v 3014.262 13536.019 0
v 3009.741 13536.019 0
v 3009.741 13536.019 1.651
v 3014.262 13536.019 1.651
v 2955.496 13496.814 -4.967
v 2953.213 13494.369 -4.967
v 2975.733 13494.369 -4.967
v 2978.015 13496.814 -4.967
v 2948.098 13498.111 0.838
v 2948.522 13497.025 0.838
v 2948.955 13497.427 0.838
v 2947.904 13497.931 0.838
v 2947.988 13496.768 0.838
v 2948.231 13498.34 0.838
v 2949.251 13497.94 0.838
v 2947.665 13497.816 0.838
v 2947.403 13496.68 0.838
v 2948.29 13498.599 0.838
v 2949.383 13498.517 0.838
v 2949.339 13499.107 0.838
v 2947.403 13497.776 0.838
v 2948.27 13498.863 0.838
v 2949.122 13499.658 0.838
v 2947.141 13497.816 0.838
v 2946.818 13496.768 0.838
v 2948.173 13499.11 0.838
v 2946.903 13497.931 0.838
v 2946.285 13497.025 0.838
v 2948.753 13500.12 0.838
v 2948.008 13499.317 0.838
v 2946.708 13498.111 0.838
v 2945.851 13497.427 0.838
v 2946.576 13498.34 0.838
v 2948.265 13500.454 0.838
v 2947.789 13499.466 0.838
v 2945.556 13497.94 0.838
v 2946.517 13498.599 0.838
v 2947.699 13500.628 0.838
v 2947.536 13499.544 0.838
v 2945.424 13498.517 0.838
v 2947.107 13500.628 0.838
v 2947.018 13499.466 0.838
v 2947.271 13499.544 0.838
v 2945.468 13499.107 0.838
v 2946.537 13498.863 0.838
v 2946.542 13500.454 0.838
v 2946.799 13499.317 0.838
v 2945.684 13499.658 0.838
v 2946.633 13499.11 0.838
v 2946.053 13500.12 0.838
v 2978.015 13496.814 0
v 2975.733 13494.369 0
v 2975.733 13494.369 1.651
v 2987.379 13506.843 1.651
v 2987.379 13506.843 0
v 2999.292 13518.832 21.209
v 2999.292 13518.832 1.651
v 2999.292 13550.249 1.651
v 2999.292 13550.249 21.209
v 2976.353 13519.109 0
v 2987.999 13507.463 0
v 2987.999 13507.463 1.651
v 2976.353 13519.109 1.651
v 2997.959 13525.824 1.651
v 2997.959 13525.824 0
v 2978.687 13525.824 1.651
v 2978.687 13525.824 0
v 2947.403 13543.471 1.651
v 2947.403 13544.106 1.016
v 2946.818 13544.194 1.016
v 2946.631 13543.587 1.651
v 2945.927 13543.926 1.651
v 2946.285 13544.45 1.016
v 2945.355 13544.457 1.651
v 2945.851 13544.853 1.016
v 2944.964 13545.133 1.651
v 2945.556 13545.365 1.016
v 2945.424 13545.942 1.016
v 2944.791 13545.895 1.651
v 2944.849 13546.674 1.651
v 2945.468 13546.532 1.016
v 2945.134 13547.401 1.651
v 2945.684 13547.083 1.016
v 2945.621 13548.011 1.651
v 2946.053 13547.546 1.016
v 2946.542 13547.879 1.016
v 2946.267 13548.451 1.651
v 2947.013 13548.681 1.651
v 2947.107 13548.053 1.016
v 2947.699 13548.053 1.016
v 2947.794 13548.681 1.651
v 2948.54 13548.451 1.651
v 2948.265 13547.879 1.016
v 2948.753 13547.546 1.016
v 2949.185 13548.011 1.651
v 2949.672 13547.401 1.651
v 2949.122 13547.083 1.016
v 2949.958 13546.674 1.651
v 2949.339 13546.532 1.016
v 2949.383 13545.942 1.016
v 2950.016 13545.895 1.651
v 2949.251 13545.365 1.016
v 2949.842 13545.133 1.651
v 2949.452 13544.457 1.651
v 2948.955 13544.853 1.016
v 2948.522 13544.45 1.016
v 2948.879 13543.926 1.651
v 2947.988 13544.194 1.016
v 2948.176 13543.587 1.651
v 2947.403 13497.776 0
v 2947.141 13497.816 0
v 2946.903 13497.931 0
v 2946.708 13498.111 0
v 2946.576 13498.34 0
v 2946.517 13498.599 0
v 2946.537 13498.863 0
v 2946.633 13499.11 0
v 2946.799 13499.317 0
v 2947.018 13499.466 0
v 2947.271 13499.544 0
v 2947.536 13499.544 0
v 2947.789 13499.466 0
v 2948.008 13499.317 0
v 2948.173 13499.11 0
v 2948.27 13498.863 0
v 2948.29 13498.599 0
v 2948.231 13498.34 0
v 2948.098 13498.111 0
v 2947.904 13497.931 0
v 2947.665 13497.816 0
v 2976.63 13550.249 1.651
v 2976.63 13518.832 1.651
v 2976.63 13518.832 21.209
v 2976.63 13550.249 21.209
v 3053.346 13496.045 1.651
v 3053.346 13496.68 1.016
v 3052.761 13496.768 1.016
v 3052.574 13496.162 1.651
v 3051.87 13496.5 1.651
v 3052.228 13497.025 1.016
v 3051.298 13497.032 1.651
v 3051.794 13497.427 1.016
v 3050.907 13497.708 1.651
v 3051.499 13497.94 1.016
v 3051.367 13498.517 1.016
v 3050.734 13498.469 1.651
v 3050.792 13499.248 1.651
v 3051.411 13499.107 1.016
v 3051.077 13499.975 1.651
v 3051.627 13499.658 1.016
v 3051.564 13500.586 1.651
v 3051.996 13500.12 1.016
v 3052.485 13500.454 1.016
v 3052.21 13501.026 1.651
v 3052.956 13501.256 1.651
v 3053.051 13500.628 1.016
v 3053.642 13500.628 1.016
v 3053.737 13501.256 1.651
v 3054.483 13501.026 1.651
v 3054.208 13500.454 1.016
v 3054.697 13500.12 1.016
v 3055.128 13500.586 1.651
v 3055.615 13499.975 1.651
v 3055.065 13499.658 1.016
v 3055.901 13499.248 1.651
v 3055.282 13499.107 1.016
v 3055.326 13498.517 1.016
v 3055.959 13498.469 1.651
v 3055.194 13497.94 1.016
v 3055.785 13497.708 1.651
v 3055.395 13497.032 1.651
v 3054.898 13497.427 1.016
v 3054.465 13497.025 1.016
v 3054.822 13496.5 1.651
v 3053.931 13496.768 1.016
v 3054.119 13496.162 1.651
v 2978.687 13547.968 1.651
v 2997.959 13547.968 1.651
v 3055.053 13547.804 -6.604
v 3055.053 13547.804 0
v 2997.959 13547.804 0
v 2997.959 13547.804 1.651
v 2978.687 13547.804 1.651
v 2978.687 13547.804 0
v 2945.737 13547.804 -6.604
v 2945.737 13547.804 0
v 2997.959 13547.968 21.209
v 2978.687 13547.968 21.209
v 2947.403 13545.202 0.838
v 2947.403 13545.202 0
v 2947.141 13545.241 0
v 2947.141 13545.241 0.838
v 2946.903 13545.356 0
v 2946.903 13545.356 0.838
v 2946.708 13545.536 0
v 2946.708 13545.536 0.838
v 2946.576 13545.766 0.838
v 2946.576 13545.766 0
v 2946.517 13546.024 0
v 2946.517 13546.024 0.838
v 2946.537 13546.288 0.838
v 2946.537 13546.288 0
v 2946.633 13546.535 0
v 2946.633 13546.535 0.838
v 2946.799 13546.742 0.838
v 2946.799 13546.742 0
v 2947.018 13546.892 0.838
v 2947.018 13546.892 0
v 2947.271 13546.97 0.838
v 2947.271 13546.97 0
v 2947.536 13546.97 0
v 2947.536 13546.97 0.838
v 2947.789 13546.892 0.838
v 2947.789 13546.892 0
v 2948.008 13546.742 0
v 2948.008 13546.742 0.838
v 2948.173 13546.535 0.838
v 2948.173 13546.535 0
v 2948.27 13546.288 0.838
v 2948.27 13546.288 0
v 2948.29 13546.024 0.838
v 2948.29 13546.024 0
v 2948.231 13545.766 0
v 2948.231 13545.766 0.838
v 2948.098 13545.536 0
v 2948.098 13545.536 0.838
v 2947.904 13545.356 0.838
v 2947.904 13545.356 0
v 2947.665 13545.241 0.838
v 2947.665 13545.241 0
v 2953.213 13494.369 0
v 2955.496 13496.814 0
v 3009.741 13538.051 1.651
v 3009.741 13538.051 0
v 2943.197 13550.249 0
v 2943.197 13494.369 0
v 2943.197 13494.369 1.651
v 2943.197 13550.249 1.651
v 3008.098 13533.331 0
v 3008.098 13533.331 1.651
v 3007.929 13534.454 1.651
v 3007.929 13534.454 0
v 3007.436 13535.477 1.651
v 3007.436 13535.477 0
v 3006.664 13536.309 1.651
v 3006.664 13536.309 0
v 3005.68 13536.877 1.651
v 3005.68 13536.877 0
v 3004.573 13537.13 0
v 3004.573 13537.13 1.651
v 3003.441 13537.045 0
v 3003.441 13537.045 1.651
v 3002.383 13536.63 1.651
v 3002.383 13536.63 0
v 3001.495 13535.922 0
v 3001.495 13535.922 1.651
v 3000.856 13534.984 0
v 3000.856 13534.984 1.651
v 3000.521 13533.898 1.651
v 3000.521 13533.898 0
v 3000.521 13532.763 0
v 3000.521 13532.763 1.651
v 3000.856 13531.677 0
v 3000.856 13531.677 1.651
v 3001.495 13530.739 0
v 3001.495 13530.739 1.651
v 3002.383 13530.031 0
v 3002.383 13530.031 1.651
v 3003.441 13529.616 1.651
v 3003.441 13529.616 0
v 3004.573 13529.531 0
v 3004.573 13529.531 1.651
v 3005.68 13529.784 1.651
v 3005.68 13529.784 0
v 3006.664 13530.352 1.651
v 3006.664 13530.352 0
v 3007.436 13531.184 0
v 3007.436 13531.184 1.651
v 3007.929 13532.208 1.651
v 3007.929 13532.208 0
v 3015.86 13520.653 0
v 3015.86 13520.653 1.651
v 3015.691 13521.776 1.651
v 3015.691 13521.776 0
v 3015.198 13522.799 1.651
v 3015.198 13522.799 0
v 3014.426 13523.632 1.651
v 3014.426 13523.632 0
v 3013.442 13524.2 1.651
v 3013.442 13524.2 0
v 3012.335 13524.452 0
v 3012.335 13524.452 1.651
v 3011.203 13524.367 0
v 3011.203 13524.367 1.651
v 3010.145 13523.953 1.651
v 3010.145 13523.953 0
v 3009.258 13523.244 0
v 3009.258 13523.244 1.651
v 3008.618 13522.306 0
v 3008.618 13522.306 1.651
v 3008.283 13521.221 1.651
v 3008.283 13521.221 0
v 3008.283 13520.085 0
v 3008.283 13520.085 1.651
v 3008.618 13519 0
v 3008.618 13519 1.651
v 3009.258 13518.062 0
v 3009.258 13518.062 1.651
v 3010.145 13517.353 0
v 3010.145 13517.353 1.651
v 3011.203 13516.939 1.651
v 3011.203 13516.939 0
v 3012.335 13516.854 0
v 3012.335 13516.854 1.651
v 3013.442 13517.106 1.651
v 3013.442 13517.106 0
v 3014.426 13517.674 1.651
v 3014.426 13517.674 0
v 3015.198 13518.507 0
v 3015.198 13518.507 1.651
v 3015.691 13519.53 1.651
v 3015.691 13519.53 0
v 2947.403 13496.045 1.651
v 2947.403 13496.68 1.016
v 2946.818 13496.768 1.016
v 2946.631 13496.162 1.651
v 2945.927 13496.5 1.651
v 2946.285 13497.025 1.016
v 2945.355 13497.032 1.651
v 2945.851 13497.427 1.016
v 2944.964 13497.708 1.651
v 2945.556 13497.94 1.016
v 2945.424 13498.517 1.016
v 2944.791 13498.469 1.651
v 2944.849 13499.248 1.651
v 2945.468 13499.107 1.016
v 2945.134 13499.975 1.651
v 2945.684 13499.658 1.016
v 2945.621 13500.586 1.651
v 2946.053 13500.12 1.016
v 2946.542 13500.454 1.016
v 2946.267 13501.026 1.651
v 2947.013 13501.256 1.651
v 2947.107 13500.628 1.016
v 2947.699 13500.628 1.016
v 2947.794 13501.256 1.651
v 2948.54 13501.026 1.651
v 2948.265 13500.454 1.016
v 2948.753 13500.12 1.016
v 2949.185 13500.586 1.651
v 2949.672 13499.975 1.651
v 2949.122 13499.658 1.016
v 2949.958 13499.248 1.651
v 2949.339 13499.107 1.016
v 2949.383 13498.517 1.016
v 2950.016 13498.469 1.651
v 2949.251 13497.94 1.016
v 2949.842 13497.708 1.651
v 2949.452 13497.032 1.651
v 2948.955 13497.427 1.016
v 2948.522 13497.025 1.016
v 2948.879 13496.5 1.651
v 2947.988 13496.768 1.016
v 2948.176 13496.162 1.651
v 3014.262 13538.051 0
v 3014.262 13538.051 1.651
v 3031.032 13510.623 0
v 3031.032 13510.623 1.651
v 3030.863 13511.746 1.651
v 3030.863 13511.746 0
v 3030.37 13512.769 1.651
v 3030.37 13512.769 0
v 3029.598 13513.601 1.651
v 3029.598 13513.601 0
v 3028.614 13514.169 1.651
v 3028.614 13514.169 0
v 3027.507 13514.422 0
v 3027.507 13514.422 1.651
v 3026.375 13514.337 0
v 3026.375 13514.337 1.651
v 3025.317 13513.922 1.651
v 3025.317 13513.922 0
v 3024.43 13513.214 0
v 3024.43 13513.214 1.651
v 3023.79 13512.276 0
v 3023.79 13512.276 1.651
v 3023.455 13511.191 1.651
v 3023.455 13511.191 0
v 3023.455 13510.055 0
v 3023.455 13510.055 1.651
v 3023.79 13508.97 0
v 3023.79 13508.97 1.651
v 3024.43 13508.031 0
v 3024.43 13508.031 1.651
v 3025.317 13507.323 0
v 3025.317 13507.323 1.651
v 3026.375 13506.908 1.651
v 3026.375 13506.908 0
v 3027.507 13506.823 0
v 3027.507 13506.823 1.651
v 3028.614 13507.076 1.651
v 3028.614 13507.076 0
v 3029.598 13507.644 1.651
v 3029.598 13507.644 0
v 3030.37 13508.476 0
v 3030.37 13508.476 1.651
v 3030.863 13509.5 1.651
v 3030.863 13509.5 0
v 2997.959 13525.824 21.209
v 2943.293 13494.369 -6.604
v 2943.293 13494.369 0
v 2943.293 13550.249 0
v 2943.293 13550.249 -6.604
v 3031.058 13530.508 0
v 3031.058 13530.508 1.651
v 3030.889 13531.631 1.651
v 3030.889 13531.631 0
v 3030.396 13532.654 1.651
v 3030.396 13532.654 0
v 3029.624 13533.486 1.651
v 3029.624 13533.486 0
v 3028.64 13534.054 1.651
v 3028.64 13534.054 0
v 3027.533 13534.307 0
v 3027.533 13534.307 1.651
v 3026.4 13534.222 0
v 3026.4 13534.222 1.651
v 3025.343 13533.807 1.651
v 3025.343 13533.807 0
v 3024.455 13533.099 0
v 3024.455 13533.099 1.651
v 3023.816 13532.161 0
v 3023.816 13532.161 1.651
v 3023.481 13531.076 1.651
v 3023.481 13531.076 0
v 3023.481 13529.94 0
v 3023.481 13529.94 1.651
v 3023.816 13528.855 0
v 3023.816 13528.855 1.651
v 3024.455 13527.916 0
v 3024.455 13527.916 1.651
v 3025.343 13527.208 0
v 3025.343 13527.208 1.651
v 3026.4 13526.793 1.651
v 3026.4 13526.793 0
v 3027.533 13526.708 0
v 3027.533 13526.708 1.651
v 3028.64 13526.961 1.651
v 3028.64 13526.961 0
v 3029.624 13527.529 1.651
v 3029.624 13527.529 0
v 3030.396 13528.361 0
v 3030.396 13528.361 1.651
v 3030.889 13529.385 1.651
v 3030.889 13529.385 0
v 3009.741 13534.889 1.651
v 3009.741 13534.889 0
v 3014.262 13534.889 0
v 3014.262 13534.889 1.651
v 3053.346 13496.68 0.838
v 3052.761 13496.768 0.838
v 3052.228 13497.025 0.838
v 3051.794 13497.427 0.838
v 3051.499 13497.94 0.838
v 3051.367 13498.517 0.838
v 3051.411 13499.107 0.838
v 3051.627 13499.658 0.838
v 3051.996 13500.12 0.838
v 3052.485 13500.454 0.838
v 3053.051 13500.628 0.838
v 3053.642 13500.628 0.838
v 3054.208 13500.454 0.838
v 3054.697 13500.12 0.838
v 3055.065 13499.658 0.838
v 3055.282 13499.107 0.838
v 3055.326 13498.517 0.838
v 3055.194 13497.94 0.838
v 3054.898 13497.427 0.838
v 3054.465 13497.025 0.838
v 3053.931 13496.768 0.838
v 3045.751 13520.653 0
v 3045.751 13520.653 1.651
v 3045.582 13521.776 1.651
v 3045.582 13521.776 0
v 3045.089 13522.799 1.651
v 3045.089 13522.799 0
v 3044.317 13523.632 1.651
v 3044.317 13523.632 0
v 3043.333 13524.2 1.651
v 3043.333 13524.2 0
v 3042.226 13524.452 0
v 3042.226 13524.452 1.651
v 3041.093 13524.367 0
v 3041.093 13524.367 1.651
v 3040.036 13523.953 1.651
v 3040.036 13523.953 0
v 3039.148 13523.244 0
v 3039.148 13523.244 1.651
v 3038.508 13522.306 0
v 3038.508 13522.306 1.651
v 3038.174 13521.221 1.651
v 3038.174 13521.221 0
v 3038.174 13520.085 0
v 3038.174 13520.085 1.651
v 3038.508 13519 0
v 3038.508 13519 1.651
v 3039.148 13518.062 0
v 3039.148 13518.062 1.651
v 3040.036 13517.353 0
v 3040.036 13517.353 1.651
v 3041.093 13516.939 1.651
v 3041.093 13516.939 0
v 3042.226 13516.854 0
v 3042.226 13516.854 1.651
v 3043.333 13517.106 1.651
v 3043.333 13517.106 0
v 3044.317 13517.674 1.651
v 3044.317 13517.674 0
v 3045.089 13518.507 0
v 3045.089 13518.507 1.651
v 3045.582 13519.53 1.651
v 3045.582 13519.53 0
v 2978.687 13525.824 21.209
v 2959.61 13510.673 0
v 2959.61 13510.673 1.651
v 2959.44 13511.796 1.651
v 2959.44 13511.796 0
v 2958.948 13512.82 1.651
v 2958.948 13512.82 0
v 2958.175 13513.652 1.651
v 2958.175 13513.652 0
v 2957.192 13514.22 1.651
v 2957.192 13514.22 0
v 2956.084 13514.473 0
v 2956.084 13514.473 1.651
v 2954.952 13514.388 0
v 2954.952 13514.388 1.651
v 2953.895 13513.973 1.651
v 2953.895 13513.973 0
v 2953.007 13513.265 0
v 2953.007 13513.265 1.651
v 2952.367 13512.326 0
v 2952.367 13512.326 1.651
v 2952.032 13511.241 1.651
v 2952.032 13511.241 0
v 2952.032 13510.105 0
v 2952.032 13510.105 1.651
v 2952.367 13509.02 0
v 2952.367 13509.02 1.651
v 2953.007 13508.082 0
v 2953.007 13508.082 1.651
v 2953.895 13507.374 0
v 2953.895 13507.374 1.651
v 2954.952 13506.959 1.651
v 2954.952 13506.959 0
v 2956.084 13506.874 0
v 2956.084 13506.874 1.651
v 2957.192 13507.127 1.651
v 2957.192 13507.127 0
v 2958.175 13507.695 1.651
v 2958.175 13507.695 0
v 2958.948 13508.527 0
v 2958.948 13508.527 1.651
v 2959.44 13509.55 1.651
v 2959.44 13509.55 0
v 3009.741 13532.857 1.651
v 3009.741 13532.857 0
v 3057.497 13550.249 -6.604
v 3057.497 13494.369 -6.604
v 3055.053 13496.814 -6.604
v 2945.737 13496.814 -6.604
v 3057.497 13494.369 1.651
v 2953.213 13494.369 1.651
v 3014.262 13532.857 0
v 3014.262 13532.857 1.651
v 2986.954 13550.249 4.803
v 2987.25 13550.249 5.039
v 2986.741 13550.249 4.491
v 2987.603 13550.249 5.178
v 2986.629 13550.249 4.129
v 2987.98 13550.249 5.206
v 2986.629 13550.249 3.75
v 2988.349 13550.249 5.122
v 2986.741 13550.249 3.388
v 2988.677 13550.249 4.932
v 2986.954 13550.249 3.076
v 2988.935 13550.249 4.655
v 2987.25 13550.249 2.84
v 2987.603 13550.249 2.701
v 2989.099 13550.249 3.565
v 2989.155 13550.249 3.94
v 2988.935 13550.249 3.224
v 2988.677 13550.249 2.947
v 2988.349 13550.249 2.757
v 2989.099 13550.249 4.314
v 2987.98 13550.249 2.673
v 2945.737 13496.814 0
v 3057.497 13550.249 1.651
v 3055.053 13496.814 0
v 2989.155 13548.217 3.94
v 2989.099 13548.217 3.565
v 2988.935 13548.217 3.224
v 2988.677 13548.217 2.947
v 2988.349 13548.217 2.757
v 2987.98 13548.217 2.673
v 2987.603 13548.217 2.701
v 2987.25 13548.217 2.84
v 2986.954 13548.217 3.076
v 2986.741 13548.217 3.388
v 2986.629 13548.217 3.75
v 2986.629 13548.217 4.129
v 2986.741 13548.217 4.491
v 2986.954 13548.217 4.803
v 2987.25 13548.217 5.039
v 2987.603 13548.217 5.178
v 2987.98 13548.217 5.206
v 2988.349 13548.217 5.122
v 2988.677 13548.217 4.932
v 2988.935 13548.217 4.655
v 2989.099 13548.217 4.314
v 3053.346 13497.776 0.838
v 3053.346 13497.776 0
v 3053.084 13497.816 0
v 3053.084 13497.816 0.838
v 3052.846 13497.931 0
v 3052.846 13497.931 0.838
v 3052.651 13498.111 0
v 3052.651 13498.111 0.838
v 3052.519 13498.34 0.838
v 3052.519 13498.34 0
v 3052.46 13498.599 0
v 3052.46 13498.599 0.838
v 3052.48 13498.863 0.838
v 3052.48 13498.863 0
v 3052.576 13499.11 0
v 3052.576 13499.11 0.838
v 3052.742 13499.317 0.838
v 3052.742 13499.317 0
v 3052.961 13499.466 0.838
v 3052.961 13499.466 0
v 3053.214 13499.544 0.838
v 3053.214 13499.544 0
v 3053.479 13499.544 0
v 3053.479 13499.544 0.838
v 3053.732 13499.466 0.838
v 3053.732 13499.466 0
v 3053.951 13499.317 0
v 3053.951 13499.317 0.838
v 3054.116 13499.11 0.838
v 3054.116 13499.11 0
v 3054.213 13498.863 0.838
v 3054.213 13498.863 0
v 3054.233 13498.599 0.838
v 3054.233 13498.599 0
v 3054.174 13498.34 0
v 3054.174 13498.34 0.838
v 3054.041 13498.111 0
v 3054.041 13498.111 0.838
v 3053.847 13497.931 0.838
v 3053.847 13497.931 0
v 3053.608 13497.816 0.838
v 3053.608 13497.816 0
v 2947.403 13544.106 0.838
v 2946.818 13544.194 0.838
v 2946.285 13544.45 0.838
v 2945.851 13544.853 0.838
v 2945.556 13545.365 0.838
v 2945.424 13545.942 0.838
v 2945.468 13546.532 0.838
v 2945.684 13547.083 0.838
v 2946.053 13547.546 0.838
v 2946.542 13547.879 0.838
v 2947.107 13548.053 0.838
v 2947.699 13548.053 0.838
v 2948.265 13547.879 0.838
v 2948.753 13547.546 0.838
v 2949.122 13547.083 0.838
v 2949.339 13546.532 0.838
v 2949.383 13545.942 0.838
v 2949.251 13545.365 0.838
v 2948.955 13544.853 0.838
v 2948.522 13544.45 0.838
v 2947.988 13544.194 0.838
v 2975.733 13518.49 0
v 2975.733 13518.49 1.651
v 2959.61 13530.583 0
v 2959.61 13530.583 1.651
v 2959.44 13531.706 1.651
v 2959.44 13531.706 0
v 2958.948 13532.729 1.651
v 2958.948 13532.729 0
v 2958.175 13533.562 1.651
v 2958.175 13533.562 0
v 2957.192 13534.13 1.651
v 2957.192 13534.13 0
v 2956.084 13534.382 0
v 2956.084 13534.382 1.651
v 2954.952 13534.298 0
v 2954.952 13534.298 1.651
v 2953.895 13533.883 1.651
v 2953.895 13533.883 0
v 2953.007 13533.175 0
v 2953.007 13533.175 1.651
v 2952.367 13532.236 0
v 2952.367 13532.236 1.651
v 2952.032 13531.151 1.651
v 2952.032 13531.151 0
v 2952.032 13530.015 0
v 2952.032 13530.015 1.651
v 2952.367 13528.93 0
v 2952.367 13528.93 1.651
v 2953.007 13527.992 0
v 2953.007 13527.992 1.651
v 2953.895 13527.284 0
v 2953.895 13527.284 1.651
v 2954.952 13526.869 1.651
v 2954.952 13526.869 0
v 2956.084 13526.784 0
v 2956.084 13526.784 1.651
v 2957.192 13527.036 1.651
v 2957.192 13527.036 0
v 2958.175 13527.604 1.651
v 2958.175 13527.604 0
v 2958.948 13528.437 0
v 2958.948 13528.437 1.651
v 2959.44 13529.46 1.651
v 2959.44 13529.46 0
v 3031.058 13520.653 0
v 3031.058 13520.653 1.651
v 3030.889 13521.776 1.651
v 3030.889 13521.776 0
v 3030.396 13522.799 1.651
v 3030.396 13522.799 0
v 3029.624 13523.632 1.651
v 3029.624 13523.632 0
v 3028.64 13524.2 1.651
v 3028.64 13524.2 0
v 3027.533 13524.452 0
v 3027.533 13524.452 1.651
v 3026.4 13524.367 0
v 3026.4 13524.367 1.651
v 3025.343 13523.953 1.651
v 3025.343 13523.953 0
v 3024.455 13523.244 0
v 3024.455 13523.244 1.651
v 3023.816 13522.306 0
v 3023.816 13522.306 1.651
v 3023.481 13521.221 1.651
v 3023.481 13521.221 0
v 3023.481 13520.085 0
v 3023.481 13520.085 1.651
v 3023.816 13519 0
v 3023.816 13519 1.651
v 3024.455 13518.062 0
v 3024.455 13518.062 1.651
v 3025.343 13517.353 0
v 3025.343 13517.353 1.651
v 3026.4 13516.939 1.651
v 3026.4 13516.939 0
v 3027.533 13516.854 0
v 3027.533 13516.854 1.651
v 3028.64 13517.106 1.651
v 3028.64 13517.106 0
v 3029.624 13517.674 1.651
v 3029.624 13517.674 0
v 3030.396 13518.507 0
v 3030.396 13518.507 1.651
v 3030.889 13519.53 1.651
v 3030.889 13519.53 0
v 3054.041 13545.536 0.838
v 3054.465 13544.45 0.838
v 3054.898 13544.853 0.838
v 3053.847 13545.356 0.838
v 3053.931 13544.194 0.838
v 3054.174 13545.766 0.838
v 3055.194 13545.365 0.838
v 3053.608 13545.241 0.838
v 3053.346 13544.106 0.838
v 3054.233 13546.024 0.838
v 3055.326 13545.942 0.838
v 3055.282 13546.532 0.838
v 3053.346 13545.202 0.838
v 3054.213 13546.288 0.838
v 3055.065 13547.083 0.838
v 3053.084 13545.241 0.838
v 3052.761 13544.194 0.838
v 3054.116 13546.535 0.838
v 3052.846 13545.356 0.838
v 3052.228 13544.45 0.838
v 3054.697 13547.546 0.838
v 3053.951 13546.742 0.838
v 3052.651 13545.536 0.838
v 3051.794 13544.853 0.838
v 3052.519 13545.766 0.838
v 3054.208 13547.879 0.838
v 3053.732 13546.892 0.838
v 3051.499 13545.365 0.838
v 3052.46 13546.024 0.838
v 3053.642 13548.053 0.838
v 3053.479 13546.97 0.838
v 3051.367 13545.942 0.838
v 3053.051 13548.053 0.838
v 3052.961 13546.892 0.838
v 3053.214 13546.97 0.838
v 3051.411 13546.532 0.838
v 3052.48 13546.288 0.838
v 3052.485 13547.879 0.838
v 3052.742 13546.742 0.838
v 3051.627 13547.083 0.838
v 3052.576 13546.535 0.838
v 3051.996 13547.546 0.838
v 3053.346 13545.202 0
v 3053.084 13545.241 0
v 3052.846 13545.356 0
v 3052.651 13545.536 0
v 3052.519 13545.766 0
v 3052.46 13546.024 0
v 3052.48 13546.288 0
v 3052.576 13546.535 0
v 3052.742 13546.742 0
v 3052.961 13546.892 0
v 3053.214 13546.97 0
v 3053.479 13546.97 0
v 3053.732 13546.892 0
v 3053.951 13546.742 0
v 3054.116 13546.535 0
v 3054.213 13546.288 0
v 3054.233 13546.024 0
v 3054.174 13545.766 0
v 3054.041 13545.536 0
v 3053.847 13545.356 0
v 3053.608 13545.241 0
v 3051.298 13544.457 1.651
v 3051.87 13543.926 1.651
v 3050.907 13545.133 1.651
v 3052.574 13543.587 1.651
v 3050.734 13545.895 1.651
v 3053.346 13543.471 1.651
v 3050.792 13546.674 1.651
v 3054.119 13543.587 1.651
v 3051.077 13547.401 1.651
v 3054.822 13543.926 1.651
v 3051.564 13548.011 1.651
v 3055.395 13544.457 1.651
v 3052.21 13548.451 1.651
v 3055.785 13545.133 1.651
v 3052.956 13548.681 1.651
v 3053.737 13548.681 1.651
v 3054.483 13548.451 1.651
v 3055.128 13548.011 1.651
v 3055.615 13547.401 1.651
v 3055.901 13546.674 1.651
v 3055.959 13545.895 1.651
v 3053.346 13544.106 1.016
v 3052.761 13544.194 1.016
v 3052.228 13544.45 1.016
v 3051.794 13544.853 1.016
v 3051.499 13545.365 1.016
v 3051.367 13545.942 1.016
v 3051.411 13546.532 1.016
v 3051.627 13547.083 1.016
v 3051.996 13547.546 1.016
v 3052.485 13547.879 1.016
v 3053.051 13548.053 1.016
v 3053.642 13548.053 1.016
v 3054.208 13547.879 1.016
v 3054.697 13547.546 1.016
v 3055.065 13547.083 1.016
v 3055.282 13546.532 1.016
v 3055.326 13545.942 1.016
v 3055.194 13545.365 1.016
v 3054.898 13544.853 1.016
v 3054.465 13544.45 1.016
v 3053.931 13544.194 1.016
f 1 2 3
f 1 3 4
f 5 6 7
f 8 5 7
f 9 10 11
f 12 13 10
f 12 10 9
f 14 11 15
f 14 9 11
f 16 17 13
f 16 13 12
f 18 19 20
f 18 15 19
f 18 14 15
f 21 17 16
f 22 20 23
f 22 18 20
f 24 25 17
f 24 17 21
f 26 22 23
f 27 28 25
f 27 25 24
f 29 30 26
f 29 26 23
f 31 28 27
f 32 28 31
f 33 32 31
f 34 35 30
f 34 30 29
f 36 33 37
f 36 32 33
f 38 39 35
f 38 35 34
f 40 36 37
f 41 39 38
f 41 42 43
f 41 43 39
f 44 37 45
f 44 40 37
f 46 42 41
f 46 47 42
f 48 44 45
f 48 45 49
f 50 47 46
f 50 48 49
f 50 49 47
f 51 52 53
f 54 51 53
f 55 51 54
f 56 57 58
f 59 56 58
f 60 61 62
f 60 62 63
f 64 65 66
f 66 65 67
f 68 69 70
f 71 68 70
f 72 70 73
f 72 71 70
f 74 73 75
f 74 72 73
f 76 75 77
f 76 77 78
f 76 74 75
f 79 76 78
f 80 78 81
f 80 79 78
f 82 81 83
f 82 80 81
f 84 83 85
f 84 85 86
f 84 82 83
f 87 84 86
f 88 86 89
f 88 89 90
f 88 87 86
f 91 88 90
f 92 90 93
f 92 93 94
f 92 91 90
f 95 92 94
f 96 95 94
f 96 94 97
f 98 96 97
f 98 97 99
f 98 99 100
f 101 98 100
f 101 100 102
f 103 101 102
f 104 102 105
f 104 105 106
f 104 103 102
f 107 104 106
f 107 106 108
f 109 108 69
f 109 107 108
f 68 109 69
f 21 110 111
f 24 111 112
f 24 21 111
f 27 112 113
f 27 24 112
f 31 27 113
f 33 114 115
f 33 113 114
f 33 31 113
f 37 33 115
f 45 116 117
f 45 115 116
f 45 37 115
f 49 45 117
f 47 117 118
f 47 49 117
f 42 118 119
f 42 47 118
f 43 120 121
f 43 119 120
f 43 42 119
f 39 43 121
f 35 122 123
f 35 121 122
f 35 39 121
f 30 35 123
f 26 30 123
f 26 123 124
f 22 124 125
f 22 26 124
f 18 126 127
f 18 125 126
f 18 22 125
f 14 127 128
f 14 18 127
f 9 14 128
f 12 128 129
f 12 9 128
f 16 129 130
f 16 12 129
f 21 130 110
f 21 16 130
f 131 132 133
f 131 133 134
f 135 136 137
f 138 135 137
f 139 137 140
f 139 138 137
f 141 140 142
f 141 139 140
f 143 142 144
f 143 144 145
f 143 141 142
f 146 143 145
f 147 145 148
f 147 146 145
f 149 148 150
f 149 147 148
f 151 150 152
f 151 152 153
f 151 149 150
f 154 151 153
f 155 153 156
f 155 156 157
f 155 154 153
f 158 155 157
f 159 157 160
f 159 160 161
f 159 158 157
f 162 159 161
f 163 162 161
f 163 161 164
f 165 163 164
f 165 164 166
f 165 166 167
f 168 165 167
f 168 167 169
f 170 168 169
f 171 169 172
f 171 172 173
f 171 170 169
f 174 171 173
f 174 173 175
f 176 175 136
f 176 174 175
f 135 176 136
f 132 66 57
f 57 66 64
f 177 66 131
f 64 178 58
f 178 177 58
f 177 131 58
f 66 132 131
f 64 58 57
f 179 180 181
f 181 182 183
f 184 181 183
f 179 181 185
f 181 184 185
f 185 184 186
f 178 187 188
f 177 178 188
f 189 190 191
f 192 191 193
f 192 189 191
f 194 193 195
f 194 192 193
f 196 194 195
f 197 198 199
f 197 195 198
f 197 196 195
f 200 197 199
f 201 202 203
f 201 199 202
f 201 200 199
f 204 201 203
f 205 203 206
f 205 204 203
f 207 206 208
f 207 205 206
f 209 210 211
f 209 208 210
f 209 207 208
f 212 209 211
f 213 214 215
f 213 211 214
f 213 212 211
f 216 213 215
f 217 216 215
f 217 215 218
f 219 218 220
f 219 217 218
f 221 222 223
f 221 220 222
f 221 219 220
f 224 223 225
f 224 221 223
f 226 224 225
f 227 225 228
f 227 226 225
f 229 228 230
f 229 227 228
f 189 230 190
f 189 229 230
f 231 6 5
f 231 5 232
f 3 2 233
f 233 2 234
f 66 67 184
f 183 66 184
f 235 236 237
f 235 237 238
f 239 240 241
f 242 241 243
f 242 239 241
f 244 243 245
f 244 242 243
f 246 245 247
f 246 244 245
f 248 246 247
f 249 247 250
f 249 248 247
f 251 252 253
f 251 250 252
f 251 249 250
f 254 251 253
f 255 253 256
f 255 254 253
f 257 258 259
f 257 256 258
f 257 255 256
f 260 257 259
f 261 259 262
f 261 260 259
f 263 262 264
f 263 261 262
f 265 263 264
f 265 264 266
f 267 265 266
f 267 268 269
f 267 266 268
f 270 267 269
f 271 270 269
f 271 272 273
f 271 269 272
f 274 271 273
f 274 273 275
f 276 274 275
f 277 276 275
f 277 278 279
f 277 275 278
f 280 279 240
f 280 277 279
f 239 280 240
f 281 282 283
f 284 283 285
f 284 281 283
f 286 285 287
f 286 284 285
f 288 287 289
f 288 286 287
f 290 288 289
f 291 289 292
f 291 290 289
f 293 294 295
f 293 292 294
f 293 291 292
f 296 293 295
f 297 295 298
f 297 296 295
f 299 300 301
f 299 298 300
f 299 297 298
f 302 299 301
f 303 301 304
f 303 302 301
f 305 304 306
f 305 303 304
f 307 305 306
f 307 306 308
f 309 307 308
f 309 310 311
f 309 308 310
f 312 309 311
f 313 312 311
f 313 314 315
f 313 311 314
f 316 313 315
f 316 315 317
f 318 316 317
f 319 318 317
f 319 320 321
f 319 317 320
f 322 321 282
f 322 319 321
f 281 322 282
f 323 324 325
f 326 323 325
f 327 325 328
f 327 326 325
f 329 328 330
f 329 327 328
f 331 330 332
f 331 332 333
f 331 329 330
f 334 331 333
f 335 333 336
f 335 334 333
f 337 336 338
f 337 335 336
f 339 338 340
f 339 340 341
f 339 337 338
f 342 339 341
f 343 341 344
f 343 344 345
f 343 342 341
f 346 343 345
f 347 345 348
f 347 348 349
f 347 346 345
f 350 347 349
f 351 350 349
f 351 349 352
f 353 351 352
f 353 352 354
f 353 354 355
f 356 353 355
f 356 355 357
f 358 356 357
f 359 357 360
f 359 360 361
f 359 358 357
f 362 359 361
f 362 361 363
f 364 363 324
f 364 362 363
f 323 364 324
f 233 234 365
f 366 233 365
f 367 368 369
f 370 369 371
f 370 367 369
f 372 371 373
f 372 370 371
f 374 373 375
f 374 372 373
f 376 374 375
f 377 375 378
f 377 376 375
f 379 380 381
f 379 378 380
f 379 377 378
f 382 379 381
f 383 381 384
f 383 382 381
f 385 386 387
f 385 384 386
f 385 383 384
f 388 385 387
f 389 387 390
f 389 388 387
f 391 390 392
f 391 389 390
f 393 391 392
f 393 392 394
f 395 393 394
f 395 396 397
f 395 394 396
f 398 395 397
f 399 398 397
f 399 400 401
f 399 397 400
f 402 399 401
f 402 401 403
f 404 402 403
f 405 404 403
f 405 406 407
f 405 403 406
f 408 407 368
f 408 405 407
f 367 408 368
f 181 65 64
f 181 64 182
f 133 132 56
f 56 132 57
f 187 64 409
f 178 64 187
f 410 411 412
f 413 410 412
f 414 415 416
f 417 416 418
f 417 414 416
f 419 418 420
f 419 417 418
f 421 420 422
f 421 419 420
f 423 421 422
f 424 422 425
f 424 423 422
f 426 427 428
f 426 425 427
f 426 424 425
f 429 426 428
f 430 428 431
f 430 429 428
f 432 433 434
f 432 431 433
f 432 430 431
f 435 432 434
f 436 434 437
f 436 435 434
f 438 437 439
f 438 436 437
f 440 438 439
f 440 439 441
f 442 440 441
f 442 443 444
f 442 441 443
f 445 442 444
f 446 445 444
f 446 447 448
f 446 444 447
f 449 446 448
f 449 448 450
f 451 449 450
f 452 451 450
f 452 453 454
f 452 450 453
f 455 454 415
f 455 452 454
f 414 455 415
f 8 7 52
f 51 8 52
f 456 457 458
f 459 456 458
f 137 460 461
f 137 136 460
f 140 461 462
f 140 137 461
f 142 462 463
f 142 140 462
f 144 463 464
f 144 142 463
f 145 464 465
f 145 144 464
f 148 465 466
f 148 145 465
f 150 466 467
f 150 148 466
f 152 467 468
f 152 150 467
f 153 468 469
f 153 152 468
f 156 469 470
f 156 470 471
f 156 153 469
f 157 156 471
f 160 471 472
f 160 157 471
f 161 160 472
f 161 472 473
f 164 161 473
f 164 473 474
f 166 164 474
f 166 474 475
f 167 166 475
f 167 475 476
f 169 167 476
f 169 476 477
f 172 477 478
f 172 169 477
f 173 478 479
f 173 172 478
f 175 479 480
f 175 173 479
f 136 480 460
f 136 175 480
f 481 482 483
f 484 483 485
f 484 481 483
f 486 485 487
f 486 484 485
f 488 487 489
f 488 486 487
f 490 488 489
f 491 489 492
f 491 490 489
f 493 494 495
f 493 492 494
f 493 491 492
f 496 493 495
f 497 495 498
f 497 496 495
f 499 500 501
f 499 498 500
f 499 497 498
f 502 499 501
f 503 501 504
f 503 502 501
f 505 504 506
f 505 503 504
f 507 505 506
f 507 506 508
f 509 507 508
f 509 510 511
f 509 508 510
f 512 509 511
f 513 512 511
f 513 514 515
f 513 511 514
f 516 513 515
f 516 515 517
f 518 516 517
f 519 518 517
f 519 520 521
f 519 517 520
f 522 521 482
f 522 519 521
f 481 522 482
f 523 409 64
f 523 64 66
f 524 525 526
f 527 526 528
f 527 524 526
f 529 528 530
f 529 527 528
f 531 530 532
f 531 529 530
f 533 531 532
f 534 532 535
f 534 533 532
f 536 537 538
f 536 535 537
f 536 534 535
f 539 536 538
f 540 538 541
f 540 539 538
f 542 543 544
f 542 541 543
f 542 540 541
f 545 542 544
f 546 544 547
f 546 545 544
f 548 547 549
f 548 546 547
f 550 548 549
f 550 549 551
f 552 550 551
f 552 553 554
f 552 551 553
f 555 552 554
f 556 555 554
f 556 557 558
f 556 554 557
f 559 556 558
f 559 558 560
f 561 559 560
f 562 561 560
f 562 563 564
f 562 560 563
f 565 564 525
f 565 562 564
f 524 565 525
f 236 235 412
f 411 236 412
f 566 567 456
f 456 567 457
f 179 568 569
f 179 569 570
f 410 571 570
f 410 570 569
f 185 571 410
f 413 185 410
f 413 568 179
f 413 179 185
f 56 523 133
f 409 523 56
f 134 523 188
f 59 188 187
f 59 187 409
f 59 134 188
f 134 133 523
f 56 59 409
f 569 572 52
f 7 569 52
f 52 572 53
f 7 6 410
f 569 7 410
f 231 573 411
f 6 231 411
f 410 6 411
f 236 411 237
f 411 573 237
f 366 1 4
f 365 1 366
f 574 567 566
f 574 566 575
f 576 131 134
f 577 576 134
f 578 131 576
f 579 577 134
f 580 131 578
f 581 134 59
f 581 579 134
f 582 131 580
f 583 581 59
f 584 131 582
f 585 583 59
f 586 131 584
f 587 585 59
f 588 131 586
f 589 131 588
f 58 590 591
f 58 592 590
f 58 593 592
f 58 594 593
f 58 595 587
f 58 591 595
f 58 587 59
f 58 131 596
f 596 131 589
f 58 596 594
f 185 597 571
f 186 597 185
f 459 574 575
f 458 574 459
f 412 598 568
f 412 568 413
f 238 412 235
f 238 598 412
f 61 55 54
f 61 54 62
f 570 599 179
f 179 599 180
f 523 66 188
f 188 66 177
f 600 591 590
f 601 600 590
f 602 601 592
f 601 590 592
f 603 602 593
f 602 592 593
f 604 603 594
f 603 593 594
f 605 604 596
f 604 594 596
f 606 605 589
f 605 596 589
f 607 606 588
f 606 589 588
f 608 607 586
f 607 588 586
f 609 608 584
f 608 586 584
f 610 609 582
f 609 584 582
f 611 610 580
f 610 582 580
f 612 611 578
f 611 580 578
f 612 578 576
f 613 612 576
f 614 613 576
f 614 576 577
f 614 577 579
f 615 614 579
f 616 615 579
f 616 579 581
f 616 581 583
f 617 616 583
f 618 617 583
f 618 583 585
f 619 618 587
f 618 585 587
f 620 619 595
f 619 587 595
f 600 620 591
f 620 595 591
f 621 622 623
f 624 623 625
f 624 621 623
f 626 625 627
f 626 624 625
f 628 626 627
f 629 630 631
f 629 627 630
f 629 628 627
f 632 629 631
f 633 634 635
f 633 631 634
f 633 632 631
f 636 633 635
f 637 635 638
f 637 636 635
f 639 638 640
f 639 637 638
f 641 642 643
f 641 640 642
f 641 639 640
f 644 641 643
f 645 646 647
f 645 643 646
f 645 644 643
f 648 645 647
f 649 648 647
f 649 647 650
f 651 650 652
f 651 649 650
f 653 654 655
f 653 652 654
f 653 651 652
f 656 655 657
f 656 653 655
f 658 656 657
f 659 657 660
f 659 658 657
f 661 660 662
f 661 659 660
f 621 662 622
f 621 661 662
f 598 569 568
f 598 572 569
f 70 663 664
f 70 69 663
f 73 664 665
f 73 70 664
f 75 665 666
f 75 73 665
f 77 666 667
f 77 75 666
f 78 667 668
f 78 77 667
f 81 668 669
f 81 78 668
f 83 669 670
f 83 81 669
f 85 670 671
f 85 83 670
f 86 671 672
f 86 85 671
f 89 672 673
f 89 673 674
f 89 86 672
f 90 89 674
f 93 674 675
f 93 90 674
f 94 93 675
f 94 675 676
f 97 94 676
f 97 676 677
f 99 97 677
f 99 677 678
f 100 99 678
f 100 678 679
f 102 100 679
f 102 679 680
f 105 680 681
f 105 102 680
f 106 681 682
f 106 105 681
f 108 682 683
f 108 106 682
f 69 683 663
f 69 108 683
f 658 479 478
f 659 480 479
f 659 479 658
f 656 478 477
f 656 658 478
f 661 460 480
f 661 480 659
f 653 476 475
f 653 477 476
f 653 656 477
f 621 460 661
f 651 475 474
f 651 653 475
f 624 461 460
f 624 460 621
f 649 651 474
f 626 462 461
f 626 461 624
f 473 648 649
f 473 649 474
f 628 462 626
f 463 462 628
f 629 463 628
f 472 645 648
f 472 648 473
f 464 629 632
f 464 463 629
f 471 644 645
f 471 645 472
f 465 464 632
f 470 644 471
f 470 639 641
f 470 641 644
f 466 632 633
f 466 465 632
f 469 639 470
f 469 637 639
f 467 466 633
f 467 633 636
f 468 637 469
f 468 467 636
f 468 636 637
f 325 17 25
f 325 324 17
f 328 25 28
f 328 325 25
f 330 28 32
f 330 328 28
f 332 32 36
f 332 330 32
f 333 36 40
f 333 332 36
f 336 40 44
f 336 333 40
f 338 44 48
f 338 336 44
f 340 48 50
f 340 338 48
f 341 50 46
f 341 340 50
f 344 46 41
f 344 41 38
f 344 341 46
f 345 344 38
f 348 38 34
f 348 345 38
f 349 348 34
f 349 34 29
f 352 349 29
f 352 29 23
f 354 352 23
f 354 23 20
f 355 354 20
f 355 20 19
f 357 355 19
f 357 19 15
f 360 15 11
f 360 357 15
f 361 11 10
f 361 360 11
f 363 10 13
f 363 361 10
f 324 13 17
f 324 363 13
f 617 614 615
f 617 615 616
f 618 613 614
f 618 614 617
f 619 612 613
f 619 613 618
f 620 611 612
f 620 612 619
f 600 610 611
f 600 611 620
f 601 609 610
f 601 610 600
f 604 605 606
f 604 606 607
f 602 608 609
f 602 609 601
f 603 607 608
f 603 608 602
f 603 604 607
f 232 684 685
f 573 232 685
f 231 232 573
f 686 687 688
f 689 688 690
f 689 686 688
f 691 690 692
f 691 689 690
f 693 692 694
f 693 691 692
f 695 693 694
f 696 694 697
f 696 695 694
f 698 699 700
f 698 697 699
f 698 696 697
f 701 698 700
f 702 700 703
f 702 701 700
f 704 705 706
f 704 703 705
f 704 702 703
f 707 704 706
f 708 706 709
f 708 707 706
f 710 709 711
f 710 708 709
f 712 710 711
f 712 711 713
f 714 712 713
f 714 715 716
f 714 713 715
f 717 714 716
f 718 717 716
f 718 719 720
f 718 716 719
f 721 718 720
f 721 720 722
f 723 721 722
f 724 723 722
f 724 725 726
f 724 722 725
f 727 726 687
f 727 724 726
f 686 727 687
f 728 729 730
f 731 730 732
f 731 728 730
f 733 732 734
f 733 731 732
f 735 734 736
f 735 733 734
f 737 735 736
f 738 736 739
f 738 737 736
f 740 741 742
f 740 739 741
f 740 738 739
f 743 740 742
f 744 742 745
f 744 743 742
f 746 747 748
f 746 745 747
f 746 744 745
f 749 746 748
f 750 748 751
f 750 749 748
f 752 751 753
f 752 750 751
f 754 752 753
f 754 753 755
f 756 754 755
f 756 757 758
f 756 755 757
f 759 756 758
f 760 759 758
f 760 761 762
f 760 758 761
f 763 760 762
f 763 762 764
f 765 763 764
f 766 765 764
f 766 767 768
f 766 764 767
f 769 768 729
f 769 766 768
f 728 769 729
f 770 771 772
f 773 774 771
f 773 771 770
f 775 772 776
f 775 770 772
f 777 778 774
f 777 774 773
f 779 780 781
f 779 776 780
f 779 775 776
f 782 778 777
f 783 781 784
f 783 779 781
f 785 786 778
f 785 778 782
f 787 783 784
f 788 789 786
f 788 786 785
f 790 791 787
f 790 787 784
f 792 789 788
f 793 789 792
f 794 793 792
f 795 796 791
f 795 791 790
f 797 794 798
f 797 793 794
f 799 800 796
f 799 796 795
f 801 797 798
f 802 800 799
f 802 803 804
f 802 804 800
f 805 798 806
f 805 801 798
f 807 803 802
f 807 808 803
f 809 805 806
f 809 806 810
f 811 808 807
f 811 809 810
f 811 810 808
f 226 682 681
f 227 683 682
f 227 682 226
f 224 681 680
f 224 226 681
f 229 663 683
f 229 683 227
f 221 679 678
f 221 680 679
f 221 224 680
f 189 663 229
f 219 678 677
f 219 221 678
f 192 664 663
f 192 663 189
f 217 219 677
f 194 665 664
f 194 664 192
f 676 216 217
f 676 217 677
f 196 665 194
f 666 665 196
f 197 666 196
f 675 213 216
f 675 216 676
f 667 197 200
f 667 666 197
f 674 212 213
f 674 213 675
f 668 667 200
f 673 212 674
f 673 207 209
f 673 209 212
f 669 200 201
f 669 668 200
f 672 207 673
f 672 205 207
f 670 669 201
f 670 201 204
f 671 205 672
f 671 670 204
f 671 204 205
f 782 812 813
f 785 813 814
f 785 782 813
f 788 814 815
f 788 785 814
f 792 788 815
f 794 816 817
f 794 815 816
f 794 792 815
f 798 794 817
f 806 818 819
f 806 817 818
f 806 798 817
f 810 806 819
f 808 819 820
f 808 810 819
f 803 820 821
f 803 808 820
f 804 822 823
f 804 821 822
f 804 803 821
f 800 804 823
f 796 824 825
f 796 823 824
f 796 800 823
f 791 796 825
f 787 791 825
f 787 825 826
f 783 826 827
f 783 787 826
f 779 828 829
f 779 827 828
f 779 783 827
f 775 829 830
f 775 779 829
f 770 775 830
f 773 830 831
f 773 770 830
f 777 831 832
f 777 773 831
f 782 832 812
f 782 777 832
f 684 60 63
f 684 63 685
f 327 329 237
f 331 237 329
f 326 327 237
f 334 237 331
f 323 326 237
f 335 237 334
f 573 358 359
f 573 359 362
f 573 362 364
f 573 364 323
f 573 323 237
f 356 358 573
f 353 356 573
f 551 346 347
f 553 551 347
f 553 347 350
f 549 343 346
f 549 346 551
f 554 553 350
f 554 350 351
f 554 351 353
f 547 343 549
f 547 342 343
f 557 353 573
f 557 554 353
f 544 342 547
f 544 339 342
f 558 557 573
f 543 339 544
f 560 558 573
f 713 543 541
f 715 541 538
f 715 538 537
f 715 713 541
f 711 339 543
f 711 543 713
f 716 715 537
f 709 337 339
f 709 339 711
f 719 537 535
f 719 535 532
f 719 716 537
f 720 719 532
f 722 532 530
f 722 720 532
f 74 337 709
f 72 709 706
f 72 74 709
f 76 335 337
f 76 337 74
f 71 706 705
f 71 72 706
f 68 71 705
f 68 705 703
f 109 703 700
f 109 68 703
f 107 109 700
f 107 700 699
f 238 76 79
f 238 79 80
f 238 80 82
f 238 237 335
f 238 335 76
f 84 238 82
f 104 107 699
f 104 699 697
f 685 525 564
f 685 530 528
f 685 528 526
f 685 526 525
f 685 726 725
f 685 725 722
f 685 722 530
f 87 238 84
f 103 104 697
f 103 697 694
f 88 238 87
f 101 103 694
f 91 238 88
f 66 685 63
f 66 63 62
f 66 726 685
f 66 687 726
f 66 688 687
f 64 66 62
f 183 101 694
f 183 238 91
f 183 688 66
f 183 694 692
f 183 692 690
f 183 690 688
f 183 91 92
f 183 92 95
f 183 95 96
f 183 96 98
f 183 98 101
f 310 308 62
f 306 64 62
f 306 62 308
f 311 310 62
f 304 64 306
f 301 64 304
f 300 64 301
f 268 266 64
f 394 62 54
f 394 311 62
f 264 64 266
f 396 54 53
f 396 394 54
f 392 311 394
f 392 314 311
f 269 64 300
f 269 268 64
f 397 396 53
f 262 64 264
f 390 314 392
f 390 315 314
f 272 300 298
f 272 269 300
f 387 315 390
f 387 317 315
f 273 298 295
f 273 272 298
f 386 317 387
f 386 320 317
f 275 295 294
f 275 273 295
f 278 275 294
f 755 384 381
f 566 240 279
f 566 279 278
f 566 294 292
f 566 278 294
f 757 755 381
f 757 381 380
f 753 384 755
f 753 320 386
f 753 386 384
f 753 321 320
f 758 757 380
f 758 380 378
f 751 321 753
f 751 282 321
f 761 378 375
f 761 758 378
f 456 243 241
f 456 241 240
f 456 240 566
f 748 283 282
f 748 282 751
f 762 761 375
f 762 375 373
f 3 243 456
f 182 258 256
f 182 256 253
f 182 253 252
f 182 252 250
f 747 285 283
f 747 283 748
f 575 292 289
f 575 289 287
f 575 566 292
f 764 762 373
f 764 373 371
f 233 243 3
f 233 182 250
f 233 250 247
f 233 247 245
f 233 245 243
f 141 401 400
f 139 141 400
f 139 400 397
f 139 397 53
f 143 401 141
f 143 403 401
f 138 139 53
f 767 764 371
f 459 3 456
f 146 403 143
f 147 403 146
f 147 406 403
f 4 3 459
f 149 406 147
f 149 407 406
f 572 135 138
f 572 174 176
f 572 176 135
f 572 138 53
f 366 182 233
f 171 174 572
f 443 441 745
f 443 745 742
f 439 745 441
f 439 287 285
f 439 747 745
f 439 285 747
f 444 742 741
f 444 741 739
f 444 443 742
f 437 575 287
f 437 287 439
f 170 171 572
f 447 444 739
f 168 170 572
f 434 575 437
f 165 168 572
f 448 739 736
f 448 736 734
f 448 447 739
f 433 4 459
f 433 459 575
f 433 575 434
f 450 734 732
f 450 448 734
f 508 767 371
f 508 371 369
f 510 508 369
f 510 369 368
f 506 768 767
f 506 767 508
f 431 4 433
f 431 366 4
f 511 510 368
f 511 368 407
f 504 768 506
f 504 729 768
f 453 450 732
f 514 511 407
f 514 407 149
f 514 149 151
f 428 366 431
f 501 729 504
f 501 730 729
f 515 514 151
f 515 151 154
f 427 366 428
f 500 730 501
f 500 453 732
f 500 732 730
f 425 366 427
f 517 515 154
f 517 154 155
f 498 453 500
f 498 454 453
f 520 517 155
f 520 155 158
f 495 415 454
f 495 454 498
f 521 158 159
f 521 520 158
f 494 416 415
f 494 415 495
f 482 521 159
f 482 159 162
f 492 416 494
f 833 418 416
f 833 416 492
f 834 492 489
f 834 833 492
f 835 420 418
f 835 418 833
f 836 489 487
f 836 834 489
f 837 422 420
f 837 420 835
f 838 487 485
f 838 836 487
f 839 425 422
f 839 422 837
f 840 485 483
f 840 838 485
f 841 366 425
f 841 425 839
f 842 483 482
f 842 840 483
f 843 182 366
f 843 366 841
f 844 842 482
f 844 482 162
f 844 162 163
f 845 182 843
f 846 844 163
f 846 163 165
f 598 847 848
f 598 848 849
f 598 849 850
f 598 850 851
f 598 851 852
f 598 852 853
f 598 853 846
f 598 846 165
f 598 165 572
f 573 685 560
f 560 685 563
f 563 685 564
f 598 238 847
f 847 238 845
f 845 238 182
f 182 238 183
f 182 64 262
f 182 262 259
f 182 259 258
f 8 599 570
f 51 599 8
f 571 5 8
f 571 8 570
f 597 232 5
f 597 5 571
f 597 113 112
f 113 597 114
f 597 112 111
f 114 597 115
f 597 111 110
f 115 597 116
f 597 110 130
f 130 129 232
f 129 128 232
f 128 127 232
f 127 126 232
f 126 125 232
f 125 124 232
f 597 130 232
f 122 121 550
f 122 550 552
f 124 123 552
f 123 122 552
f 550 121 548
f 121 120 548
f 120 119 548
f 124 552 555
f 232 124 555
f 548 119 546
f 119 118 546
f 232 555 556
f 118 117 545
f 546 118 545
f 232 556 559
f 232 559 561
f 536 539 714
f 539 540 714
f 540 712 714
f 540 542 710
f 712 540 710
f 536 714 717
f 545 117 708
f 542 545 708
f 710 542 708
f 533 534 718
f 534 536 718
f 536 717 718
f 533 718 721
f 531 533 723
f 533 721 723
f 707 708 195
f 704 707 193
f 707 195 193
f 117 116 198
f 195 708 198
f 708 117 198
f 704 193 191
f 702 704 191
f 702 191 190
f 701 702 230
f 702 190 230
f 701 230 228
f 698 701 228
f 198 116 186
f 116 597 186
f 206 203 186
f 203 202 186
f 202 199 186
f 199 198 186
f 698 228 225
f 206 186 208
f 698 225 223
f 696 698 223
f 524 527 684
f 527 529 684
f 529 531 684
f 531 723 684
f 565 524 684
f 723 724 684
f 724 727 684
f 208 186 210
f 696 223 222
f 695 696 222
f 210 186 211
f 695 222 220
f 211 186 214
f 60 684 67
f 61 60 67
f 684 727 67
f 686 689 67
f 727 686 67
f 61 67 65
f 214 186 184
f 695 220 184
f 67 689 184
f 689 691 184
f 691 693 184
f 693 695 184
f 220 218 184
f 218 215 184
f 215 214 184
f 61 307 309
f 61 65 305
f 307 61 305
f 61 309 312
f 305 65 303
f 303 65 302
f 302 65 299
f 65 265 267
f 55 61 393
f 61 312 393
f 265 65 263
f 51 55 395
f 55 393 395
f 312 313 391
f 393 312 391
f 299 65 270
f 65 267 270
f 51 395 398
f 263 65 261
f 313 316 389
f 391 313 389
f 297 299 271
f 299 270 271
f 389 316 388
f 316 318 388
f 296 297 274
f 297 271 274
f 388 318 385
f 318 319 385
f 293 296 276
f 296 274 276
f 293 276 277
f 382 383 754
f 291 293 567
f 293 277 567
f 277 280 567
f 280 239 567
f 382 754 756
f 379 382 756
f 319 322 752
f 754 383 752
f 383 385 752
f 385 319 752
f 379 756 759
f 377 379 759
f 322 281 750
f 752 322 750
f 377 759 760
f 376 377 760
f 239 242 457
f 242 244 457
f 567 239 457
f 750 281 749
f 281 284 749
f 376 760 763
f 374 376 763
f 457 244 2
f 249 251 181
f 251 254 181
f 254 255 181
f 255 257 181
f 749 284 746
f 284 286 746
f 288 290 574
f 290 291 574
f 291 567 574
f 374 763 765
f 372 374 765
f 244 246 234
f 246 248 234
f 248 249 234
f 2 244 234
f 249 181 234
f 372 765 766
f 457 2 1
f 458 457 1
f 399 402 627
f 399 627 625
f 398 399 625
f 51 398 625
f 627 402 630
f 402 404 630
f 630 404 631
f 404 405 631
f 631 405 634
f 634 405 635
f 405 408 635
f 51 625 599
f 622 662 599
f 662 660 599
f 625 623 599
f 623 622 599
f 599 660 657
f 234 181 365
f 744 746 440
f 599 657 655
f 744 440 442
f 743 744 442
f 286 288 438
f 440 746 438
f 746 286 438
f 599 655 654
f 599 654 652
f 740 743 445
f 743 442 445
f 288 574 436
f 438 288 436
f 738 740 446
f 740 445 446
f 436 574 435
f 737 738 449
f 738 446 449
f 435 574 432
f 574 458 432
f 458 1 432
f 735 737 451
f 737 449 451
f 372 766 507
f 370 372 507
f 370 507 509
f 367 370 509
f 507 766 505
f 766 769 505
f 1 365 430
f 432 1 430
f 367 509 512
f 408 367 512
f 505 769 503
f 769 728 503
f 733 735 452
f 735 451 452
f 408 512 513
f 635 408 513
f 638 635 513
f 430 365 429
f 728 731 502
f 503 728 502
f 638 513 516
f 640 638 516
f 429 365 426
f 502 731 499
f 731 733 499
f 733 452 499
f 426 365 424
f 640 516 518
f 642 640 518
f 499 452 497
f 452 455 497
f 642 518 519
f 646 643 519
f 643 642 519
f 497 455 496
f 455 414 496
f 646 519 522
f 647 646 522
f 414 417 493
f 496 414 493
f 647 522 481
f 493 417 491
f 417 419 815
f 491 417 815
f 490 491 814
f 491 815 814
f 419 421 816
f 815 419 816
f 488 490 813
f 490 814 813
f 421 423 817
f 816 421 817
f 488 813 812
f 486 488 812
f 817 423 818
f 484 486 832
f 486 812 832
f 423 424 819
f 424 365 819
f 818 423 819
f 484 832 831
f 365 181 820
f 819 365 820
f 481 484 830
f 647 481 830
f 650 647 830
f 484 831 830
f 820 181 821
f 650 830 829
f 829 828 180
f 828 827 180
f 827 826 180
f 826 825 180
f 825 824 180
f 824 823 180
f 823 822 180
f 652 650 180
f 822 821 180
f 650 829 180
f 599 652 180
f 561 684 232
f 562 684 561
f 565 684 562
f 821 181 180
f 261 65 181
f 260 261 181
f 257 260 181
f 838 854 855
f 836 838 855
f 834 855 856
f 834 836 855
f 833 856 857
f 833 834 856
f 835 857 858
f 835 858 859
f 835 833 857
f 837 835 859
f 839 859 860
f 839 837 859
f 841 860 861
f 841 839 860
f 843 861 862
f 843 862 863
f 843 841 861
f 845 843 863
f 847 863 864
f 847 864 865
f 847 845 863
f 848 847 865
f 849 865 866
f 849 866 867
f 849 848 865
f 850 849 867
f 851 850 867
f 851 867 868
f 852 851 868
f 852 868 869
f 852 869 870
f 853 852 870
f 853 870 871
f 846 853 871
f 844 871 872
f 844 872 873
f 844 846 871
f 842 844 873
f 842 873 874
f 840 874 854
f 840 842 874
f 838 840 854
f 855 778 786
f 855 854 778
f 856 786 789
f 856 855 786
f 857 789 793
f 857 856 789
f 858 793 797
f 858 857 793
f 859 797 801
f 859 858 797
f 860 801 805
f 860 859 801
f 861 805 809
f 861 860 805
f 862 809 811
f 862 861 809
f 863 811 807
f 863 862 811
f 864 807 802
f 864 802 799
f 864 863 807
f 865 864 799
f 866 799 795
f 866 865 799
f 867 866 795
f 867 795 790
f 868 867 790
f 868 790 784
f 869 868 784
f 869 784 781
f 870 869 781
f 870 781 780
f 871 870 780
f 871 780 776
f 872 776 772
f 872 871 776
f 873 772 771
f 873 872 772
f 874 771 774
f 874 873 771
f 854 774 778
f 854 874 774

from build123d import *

# Parameters (mm, degrees)
SKETCH1_W                                   = 114.3
SKETCH1_H                                   = 55.88
BOSS_EXTRUDE1_DEPTH                         = 1.651
SKETCH2_R                                   = 3.81
SKETCH2_W                                   = 4.5212
SKETCH2_H                                   = 2.032
CUT_EXTRUDE2_DEPTH                          = 2.651
SKETCH3_W                                   = 22.661984054
SKETCH3_H                                   = 31.417286438
BOSS_EXTRUDE2_DEPTH                         = 19.558
SKETCH7_W                                   = 19.271471292
SKETCH7_H                                   = 22.14393761
CUT_EXTRUDE5_DEPTH                          = 20.558
SKETCH8_W                                   = 114.20462943
SKETCH8_H                                   = 55.88
SKETCH8_W_2                                 = 109.31537057
SKETCH8_H_2                                 = 50.990741141
BOSS_EXTRUDE4_DEPTH                         = 6.604
SKETCH9_R                                   = 1.27
CUT_EXTRUDE6_DEPTH                          = 2.032
SKETCH10_W                                  = 22.51976533
SKETCH10_H                                  = 4.967150309
CUT_EXTRUDE7_DEPTH                          = 12.7
CBORE_FOR_0_BINDING_HEAD_MACHINE_SC_2_COUNT = 2
CBORE_FOR_0_BINDING_HEAD_MACHINE_SC_2_PITCH = 47.42542097
CBORE_FOR_0_BINDING_HEAD_MACHINE_SC_3_COUNT = 2
CBORE_FOR_0_BINDING_HEAD_MACHINE_SC_3_PITCH = 105.943027259
CBORE_FOR_0_BINDING_HEAD_MACHINE_SC_4_COUNT = 2
CBORE_FOR_0_BINDING_HEAD_MACHINE_SC_4_PITCH = 116.073664451


with BuildPart() as part:
    # Sketch1 → Boss-Extrude1 (new body)
    with BuildSketch(Plane.XY):
        with Locations((3000.347199497, 13522.309097574)):
            Rectangle(SKETCH1_W, SKETCH1_H)
    extrude(amount=BOSS_EXTRUDE1_DEPTH)

    # Sketch2 → Cut-Extrude2 (cut, through all)
    with BuildSketch(Plane.XY):
        with Locations((3027.248279136, 13530.507714547)):
            Circle(SKETCH2_R)
        with Locations((3012.050482156, 13520.653009344)):
            Circle(SKETCH2_R)
        with Locations((3027.248279136, 13520.653009344)):
            Circle(SKETCH2_R)
        with Locations((3041.941037356, 13520.653009344)):
            Circle(SKETCH2_R)
        with Locations((3027.222481478, 13510.622681626)):
            Circle(SKETCH2_R)
        with Locations((3004.288363872, 13533.330573619)):
            Circle(SKETCH2_R)
        with Locations((2955.799681977, 13530.583123085)):
            Circle(SKETCH2_R)
        with Locations((2955.799681977, 13510.673284723)):
            Circle(SKETCH2_R)
        with Locations((3012.001784077, 13533.872650423)):
            Rectangle(SKETCH2_W, SKETCH2_H)
        with Locations((3012.001784077, 13537.034507661)):
            Rectangle(SKETCH2_W, SKETCH2_H)
        Polygon((2997.958816699, 13534.888650423), (2997.958816699, 13525.823845972), (2978.687345407, 13525.823845972), (2978.687345407, 13547.804468145), (2997.958816699, 13547.804468145), align=None)
        Polygon((2975.733076321, 13518.489618725), (2953.213310991, 13494.369097574), (2975.733076321, 13494.369097574), (2987.379412932, 13506.843282115), (2987.998983464, 13507.462852647), (2976.352646854, 13519.109189258), align=None)
    extrude(amount=CUT_EXTRUDE2_DEPTH, mode=Mode.SUBTRACT)

    # Sketch8 → Boss-Extrude4 (add)
    with BuildSketch(Plane(origin=(0, 0, 0), x_dir=(-1, 0, 0), z_dir=(0, 0, -1))):
        with Locations((-3000.394884782, 13522.309097574)):
            Rectangle(SKETCH8_W, SKETCH8_H)
        with Locations((-3000.394884782, 13522.309097574)):
            Rectangle(SKETCH8_W_2, SKETCH8_H_2, mode=Mode.SUBTRACT)
    extrude(amount=BOSS_EXTRUDE4_DEPTH)

    # Sketch10 → Cut-Extrude7 (cut, along a direction that is not the sketch's normal)
    with BuildSketch(Plane.XZ.offset(-13494.369097574)):
        with Locations((2964.473193656, -2.483575154)):
            Rectangle(SKETCH10_W, SKETCH10_H)
    extrude(amount=-CUT_EXTRUDE7_DEPTH, dir=(-0.682436128, -0.730945231, 0), mode=Mode.SUBTRACT)

    # Sketch12 → CBORE for #0 Binding Head Machine Screw1 (revolve, cut)
    with BuildSketch(Plane(origin=(3053.346374668, 13546.090548366, 1.651), x_dir=(0, -1, 0), z_dir=(1, 0, 0))):
        Polygon((0, 0), (0, 8.255025), (0.889, 8.255025), (0.889, 0.8128), (1.98501, 0.8128), (1.98501, 0.635), (2.62001, 0), align=None)
    cbore_for_0_binding_head_machine_screw1 = revolve(axis=Axis((3053.346374668, 13546.090548366, 8.001), (0, 0, -1)), mode=Mode.SUBTRACT)

    # CBORE for _0 Binding Head Machine Sc 2: CBORE for #0 Binding Head Machine Screw1 ×2
    with Locations(*[(0, -i * CBORE_FOR_0_BINDING_HEAD_MACHINE_SC_2_PITCH, 0) for i in range(1, CBORE_FOR_0_BINDING_HEAD_MACHINE_SC_2_COUNT)]):
        add(cbore_for_0_binding_head_machine_screw1, mode=Mode.SUBTRACT)

    # CBORE for _0 Binding Head Machine Sc 3: CBORE for #0 Binding Head Machine Screw1 ×2
    with Locations(*[(-i * CBORE_FOR_0_BINDING_HEAD_MACHINE_SC_3_PITCH, 0, 0) for i in range(1, CBORE_FOR_0_BINDING_HEAD_MACHINE_SC_3_COUNT)]):
        add(cbore_for_0_binding_head_machine_screw1, mode=Mode.SUBTRACT)

    # CBORE for _0 Binding Head Machine Sc 4: CBORE for #0 Binding Head Machine Screw1 ×2
    with Locations(*[Vector(-0.912722345, -0.408580372, 0) * (i * CBORE_FOR_0_BINDING_HEAD_MACHINE_SC_4_PITCH) for i in range(1, CBORE_FOR_0_BINDING_HEAD_MACHINE_SC_4_COUNT)]):
        add(cbore_for_0_binding_head_machine_screw1, mode=Mode.SUBTRACT)


with BuildPart() as body_2:
    # Sketch3 → Boss-Extrude2 (new body)
    with BuildSketch(Plane.XY.offset(1.651)):
        with Locations((2987.961017002, 13534.540454355)):
            Rectangle(SKETCH3_W, SKETCH3_H)
    extrude(amount=BOSS_EXTRUDE2_DEPTH)

    # Sketch7 → Cut-Extrude5 (cut, through all)
    with BuildSketch(Plane(origin=(0, 0, 1.651), x_dir=(-1, 0, 0), z_dir=(0, 0, -1))):
        with Locations((-2988.323081053, 13536.895814777)):
            Rectangle(SKETCH7_W, SKETCH7_H)
    extrude(amount=-CUT_EXTRUDE5_DEPTH, mode=Mode.SUBTRACT)

    # Sketch9 → Cut-Extrude6 (cut)
    with BuildSketch(Plane(origin=(0, 13550.249097574, 0), x_dir=(1, 0, 0), z_dir=(0, 1, 0))):
        with Locations((2987.885210123, -3.939502026)):
            Circle(SKETCH9_R)
    extrude(amount=-CUT_EXTRUDE6_DEPTH, mode=Mode.SUBTRACT)


solid = Compound([part.part, body_2.part])
